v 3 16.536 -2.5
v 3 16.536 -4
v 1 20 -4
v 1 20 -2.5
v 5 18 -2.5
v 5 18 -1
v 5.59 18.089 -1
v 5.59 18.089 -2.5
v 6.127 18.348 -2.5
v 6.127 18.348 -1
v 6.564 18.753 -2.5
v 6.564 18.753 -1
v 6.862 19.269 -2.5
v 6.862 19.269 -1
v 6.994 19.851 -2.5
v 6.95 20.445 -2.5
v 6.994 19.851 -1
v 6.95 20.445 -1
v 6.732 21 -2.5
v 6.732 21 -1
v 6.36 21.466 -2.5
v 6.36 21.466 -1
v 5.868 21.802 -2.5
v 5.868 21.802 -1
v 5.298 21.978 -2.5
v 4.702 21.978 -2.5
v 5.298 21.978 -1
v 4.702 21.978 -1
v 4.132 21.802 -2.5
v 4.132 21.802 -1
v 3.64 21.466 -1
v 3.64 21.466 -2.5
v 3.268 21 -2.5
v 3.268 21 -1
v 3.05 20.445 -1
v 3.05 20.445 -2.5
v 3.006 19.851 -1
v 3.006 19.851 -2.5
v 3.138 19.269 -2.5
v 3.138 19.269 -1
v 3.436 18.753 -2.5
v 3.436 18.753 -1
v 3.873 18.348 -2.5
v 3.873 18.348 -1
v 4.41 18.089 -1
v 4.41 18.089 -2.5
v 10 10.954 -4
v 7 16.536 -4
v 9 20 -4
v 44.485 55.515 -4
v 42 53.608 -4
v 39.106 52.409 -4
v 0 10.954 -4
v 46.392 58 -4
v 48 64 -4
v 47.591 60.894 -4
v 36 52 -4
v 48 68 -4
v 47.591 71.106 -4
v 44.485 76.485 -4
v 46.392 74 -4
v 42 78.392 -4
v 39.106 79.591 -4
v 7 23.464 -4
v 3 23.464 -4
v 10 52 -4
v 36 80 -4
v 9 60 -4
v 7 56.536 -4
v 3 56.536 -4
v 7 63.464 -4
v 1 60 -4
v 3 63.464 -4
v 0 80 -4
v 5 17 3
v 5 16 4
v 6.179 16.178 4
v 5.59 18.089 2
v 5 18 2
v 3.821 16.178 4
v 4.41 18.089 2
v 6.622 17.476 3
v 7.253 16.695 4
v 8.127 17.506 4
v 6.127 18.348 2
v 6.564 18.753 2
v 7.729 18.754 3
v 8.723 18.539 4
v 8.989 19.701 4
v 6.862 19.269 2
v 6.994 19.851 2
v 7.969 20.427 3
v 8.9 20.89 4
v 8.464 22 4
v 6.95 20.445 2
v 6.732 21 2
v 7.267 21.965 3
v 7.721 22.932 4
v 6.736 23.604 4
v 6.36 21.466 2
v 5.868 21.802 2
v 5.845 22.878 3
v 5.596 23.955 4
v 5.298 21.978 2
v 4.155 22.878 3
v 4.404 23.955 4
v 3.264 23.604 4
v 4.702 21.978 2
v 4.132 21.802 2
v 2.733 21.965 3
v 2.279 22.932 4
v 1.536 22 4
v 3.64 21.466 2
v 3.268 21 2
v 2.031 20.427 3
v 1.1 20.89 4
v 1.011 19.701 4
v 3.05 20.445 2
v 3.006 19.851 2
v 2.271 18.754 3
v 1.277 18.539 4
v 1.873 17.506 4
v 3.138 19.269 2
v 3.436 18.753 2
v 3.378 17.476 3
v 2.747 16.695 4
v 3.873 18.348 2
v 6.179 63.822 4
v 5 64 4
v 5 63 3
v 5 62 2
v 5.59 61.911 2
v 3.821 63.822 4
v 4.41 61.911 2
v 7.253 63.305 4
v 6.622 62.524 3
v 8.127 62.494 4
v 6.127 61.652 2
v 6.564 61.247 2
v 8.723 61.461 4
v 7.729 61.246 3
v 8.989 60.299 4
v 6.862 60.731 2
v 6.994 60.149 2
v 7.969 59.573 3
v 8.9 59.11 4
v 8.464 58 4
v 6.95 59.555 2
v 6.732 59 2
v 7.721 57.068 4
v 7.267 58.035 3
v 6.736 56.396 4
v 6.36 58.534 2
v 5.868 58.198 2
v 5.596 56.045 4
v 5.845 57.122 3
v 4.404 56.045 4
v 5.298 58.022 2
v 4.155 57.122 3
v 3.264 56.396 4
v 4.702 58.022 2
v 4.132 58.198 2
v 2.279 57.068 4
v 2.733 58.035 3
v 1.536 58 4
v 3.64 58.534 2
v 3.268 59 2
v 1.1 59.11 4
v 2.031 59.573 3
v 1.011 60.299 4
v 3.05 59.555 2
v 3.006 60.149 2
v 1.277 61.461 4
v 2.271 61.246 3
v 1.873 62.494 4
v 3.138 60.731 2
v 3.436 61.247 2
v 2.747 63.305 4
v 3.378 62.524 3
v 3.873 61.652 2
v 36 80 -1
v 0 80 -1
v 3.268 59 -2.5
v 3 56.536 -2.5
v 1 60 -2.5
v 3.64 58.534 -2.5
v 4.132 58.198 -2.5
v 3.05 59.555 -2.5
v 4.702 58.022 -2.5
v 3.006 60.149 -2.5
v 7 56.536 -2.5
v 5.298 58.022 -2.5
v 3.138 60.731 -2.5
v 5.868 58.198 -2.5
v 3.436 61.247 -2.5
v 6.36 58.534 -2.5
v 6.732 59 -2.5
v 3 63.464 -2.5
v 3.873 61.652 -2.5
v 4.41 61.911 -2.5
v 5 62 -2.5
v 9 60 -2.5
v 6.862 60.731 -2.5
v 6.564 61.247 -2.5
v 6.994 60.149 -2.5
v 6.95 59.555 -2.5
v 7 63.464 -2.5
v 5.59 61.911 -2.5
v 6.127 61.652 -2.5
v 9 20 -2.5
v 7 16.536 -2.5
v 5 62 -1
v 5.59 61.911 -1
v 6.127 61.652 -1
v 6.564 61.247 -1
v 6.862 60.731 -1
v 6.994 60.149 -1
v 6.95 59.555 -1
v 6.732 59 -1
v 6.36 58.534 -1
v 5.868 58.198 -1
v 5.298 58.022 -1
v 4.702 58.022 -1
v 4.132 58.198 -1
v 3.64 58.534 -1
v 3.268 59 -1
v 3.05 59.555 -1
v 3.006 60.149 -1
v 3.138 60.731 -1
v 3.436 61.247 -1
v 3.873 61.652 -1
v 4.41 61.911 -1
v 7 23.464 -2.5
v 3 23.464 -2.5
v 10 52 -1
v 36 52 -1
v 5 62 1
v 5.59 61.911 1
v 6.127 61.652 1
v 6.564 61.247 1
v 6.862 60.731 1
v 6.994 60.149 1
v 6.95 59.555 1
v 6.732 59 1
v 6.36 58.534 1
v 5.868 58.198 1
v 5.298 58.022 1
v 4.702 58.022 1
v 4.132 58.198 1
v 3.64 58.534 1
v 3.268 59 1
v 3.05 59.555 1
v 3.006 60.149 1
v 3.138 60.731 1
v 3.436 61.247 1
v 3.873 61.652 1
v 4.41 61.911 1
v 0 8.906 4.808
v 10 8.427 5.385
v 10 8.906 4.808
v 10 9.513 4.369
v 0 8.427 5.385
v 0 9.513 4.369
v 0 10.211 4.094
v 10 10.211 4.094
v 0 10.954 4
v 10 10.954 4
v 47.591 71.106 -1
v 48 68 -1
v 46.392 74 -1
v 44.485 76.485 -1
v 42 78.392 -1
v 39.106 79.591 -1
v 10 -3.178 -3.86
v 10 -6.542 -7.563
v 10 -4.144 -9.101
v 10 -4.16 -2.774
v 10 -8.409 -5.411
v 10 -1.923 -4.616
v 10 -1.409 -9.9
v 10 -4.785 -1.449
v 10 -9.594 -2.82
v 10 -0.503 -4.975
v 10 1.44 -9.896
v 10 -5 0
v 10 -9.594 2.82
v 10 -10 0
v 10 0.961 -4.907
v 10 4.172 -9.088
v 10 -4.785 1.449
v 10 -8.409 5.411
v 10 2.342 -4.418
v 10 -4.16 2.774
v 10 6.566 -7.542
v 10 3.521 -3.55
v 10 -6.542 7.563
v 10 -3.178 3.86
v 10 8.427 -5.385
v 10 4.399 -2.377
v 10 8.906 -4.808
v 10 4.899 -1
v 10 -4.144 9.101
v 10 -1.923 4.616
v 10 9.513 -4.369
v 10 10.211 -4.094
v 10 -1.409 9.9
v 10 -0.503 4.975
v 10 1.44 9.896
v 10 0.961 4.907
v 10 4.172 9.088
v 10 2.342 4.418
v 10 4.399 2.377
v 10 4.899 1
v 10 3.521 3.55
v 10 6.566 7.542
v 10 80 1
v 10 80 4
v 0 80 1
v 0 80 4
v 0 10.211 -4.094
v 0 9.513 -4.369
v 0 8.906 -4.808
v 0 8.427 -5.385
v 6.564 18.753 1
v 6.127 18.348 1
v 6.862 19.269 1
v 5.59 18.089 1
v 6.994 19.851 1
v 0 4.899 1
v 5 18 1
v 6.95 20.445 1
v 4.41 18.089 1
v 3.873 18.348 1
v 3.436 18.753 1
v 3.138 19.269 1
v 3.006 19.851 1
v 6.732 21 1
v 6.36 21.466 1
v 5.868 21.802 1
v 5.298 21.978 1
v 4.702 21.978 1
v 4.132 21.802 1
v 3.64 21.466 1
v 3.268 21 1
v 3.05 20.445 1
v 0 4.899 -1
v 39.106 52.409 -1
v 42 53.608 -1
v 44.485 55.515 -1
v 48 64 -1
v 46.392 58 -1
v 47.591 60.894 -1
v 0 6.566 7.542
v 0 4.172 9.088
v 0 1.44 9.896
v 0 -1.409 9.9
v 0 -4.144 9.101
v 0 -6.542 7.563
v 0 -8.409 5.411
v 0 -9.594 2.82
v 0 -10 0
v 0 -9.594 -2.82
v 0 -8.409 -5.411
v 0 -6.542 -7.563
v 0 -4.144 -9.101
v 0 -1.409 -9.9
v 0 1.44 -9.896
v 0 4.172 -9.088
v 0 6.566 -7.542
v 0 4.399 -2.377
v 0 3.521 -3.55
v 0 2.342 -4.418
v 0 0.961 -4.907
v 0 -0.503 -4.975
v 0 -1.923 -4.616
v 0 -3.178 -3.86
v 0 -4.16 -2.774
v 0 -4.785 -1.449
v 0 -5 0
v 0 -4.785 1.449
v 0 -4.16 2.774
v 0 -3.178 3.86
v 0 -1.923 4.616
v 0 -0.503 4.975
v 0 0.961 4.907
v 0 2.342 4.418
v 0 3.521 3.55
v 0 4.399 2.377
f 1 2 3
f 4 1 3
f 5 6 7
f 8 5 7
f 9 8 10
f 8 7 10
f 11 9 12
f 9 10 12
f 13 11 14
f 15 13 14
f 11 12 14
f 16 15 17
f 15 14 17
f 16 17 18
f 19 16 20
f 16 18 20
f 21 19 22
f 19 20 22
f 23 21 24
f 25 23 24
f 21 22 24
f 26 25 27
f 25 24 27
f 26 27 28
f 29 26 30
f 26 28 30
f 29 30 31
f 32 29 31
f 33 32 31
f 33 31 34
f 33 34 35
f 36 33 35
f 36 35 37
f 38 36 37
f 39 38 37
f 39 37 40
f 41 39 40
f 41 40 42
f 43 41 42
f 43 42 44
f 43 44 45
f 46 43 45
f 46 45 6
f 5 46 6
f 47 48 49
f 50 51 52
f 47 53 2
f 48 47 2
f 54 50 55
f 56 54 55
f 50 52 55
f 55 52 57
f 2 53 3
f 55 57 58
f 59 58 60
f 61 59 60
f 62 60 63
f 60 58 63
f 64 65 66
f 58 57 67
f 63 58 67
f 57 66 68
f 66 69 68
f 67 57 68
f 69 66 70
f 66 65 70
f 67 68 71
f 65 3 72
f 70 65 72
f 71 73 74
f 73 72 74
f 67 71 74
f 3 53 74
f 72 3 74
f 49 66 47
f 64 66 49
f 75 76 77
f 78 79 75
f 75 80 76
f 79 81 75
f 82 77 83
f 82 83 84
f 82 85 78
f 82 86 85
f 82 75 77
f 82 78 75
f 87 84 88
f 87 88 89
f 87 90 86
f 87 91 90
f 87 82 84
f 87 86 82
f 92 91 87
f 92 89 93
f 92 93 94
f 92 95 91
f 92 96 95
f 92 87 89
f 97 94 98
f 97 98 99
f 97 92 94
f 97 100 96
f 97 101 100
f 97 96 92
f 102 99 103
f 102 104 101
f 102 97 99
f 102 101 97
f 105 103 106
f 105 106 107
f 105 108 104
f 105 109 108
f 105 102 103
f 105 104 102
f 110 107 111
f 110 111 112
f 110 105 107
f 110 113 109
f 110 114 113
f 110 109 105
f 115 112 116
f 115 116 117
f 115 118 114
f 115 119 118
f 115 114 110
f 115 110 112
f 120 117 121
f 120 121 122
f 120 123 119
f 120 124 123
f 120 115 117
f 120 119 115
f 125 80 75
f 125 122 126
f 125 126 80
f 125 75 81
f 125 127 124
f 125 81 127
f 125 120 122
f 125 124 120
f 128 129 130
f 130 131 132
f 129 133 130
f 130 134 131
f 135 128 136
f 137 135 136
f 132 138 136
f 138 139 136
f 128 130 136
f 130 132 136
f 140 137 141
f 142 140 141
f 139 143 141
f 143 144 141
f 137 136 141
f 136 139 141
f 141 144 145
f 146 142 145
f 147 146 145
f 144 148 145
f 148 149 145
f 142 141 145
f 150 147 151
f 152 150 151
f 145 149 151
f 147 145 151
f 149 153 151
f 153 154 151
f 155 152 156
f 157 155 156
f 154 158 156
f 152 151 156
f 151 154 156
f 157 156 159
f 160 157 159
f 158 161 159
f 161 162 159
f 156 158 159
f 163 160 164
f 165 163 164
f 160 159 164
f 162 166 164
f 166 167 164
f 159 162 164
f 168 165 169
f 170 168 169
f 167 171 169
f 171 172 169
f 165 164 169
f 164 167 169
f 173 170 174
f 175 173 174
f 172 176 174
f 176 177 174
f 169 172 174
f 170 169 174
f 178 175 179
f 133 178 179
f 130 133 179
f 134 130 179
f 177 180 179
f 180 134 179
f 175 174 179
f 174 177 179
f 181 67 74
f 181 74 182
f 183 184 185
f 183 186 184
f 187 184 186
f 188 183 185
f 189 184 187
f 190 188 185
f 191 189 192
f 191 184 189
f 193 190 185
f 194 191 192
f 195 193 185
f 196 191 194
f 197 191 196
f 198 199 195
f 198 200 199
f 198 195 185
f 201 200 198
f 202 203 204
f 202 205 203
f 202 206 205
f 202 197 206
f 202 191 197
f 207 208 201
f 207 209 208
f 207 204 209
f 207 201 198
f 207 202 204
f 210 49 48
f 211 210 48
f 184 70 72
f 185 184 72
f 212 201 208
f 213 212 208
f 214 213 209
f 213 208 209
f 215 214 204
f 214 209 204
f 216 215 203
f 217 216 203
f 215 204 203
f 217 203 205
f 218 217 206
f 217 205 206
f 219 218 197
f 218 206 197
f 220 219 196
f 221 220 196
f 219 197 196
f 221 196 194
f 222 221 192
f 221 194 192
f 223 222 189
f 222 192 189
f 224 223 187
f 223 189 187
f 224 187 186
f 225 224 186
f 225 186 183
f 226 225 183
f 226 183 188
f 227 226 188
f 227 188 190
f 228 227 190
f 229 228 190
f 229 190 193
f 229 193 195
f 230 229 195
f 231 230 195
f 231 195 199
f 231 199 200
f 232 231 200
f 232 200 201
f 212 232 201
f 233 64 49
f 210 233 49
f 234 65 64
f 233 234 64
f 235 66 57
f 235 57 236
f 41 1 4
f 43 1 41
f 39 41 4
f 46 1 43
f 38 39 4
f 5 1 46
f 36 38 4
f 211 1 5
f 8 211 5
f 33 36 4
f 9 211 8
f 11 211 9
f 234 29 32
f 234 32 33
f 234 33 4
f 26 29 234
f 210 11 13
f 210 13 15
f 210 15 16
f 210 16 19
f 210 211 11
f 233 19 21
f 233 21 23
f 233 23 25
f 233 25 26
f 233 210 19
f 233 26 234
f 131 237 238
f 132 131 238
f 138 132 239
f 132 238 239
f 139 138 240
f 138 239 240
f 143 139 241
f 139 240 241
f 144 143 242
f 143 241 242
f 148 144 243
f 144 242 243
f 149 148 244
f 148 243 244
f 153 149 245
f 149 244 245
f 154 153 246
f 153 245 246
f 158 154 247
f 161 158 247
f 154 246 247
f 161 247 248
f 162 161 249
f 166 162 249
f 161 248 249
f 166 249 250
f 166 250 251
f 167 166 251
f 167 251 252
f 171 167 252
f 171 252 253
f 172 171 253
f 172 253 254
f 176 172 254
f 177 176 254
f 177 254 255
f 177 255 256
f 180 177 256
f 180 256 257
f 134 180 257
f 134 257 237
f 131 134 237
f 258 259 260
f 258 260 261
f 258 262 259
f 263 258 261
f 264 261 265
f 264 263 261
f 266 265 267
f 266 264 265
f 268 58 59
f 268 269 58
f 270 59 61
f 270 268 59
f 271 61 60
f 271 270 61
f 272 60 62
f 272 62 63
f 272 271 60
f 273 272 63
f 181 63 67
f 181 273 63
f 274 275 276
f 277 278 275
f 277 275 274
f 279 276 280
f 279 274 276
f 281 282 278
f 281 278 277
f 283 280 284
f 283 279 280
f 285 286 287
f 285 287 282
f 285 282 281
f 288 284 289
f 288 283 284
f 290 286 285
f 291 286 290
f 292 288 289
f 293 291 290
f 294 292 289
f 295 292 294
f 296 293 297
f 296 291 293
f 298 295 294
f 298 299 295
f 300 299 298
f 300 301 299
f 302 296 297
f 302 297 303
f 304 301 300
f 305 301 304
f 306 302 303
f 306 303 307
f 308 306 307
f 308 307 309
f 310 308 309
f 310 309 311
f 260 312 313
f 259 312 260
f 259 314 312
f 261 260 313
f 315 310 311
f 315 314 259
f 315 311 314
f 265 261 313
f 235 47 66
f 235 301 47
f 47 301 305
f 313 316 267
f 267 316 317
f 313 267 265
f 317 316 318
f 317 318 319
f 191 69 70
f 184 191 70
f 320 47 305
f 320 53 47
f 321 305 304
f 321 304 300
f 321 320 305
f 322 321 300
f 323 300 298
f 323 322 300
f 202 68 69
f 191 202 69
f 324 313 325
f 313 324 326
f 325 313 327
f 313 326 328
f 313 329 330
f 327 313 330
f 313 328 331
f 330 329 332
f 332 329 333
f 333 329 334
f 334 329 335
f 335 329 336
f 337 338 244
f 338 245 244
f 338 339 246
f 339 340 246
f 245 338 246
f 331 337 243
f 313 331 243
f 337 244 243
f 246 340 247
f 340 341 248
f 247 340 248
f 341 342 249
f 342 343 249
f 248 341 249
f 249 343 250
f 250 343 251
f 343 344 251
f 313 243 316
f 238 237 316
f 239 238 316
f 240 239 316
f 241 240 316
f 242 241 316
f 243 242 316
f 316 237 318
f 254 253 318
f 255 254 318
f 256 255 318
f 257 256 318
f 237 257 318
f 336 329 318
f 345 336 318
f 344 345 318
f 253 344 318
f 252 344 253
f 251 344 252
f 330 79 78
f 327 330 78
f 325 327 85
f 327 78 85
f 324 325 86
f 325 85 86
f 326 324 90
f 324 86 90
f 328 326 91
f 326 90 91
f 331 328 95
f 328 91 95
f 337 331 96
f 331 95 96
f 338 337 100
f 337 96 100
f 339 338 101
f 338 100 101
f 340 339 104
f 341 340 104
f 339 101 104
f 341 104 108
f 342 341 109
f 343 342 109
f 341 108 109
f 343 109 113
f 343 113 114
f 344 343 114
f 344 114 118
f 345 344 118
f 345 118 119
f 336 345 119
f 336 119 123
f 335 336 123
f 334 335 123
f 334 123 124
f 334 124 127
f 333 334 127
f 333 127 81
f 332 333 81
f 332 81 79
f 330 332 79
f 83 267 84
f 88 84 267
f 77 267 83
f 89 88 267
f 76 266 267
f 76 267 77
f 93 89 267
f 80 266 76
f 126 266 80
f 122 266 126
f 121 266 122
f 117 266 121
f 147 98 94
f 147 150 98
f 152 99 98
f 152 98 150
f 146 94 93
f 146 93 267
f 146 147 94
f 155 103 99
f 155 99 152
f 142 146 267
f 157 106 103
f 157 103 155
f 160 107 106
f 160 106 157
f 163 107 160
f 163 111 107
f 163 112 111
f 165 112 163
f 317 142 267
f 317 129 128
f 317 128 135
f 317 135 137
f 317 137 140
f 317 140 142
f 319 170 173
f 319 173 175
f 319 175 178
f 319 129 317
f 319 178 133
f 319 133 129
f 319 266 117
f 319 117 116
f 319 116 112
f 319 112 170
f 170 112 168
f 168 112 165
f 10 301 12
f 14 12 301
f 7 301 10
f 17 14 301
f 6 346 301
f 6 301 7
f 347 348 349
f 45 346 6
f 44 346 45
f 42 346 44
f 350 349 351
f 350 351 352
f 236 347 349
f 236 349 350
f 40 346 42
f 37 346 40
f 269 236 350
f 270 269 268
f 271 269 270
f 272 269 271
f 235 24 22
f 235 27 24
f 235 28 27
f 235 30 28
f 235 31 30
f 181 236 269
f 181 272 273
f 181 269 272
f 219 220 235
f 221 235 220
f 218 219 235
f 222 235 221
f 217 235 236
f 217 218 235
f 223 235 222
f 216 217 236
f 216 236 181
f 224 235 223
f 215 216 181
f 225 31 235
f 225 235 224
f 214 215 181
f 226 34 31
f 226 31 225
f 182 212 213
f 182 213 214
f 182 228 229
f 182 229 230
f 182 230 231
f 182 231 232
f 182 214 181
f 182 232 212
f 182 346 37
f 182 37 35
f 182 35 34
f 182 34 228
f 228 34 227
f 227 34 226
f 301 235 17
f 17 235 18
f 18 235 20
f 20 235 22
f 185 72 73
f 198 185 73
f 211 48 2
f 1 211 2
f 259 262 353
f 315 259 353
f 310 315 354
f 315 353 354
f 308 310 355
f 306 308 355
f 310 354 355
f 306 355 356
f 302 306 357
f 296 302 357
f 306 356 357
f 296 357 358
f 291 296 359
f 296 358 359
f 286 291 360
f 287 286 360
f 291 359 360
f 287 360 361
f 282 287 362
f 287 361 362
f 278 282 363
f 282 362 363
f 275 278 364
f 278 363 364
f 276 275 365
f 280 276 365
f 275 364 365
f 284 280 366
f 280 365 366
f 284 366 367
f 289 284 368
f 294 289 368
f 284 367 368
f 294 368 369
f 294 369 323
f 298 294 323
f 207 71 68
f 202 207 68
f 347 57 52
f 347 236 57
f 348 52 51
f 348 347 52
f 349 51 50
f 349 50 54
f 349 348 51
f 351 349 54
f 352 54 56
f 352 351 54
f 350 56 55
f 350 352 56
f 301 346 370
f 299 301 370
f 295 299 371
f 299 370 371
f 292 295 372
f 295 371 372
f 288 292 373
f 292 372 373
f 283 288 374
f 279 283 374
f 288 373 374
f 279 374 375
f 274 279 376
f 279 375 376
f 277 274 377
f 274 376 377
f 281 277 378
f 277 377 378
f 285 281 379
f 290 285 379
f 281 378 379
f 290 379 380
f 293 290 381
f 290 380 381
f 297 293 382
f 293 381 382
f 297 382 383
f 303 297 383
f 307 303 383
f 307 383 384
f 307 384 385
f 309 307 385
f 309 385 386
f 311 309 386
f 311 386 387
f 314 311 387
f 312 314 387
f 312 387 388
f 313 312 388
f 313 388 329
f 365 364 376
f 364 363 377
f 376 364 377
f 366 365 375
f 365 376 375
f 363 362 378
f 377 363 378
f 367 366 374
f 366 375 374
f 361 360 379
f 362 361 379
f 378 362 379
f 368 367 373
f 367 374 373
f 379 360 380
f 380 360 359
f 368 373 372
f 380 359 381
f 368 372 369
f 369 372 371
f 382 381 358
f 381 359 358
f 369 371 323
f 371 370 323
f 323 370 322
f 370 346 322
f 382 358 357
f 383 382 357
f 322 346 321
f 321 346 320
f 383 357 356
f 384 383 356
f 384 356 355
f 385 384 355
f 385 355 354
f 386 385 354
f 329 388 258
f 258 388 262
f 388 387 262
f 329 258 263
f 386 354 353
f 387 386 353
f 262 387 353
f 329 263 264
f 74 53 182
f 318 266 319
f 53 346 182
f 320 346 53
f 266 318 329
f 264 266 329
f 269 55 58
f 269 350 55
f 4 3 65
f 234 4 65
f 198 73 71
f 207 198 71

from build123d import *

# Parameters (mm, degrees)
SKETCH_R        = 10
PAD_DEPTH       = 10
HOLE_DEPTH      = 0.001
HOLE_FACE4_R    = 5
POCKET_DEPTH    = 11
SKETCH001_W     = 75
SKETCH001_H     = 3
PAD001_DEPTH    = 10
SKETCH002_W     = 5.5
SKETCH002_H     = 2
POCKET001_DEPTH = 10
FILLET_R        = 3
FILLET001_R     = 3
POCKET002_DEPTH = 1.5
SKETCH004_R     = 2
POCKET003_DEPTH = 7
CHAMFER_SIZE    = 2
SKETCH005_R     = 2
POCKET004_DEPTH = 7
CHAMFER001_SIZE = 2
SKETCH006_W     = 28
SKETCH006_H     = 3
PAD002_DEPTH    = 38
FILLET002_R     = 12


with BuildPart() as part:
    # Sketch → Pad (new body)
    with BuildSketch(Plane.YZ):
        Circle(SKETCH_R)
    extrude(amount=PAD_DEPTH)

    # Sketch → Hole (cut, through all)
    with BuildSketch(Plane.YZ):
        Circle(SKETCH_R)
    extrude(amount=-HOLE_DEPTH, mode=Mode.SUBTRACT)

    # Hole Face4 → Pocket (cut)
    with BuildSketch(Plane(origin=(0, 0, 0), x_dir=(0, 1, 0), z_dir=(-1, 0, 0))):
        Circle(HOLE_FACE4_R)
    extrude(amount=-POCKET_DEPTH, mode=Mode.SUBTRACT)

    # Sketch001 → Pad001 (join)
    with BuildSketch(Plane.YZ):
        with Locations((42.5, 2.5)):
            Rectangle(SKETCH001_W, SKETCH001_H)
        with Locations((42.5, -2.5)):
            Rectangle(SKETCH001_W, SKETCH001_H)
    extrude(amount=PAD001_DEPTH)

    # Sketch002 (on Face2 of Pad001) → Pocket001 (cut)
    with BuildSketch(Plane(origin=(0, 0, 0), x_dir=(0, 1, 0), z_dir=(-1, 0, 0))):
        with Locations((7.25, 0)):
            Rectangle(SKETCH002_W, SKETCH002_H)
    extrude(amount=-POCKET001_DEPTH, mode=Mode.SUBTRACT)

    # Fillet
    fillet_edges = [part.edges().sort_by_distance(p)[0] for p in [
        (5, 9.165151, -4),
    ]]
    fillet(fillet_edges, radius=FILLET_R)

    # Fillet001
    fillet001_edges = [part.edges().sort_by_distance(p)[0] for p in [
        (5, 9.165151, 4),
    ]]
    fillet(fillet001_edges, radius=FILLET001_R)

    # Sketch003 (on Face17 of Fillet001) → Pocket002 (cut)
    with BuildSketch(Plane.YX.offset(4)):
        Polygon((23.464102, 3), (23.464102, 7), (20, 9), (16.535898, 7), (16.535898, 3), (20, 1), align=None)
        Polygon((63.464102, 3), (63.464102, 7), (60, 9), (56.535898, 7), (56.535898, 3), (60, 1), align=None)
    extrude(amount=-POCKET002_DEPTH, mode=Mode.SUBTRACT)

    # Sketch004 (on Face13 of Pocket002) → Pocket003 (cut)
    with BuildSketch(Plane(origin=(0, 0, 4), x_dir=(0, -1, 0), z_dir=(0, 0, 1))):
        with Locations((-20, 5)):
            Circle(SKETCH004_R)
    extrude(amount=-POCKET003_DEPTH, mode=Mode.SUBTRACT)

    # Chamfer
    chamfer_edges = [part.edges().sort_by_distance(p)[0] for p in [
        (5, 22, 4),
    ]]
    chamfer(chamfer_edges, length=CHAMFER_SIZE)

    # Sketch005 (on Face40 of Chamfer) → Pocket004 (cut)
    with BuildSketch(Plane.YX.offset(2.5)):
        with Locations((60, 5)):
            Circle(SKETCH005_R)
    extrude(amount=-POCKET004_DEPTH, mode=Mode.SUBTRACT)

    # Chamfer001
    chamfer001_edges = [part.edges().sort_by_distance(p)[0] for p in [
        (5, 58, 4),
    ]]
    chamfer(chamfer001_edges, length=CHAMFER001_SIZE)

    # Sketch006 (on Face6 of Chamfer001) → Pad002 (join)
    with BuildSketch(Plane.YZ.offset(10)):
        with Locations((66, -2.5)):
            Rectangle(SKETCH006_W, SKETCH006_H)
    extrude(amount=PAD002_DEPTH)

    # Fillet002
    fillet002_edges = [part.edges().sort_by_distance(p)[0] for p in [
        (48, 52, -2.5),
        (48, 80, -2.5),
    ]]
    fillet(fillet002_edges, radius=FILLET002_R)


solid = part.part
